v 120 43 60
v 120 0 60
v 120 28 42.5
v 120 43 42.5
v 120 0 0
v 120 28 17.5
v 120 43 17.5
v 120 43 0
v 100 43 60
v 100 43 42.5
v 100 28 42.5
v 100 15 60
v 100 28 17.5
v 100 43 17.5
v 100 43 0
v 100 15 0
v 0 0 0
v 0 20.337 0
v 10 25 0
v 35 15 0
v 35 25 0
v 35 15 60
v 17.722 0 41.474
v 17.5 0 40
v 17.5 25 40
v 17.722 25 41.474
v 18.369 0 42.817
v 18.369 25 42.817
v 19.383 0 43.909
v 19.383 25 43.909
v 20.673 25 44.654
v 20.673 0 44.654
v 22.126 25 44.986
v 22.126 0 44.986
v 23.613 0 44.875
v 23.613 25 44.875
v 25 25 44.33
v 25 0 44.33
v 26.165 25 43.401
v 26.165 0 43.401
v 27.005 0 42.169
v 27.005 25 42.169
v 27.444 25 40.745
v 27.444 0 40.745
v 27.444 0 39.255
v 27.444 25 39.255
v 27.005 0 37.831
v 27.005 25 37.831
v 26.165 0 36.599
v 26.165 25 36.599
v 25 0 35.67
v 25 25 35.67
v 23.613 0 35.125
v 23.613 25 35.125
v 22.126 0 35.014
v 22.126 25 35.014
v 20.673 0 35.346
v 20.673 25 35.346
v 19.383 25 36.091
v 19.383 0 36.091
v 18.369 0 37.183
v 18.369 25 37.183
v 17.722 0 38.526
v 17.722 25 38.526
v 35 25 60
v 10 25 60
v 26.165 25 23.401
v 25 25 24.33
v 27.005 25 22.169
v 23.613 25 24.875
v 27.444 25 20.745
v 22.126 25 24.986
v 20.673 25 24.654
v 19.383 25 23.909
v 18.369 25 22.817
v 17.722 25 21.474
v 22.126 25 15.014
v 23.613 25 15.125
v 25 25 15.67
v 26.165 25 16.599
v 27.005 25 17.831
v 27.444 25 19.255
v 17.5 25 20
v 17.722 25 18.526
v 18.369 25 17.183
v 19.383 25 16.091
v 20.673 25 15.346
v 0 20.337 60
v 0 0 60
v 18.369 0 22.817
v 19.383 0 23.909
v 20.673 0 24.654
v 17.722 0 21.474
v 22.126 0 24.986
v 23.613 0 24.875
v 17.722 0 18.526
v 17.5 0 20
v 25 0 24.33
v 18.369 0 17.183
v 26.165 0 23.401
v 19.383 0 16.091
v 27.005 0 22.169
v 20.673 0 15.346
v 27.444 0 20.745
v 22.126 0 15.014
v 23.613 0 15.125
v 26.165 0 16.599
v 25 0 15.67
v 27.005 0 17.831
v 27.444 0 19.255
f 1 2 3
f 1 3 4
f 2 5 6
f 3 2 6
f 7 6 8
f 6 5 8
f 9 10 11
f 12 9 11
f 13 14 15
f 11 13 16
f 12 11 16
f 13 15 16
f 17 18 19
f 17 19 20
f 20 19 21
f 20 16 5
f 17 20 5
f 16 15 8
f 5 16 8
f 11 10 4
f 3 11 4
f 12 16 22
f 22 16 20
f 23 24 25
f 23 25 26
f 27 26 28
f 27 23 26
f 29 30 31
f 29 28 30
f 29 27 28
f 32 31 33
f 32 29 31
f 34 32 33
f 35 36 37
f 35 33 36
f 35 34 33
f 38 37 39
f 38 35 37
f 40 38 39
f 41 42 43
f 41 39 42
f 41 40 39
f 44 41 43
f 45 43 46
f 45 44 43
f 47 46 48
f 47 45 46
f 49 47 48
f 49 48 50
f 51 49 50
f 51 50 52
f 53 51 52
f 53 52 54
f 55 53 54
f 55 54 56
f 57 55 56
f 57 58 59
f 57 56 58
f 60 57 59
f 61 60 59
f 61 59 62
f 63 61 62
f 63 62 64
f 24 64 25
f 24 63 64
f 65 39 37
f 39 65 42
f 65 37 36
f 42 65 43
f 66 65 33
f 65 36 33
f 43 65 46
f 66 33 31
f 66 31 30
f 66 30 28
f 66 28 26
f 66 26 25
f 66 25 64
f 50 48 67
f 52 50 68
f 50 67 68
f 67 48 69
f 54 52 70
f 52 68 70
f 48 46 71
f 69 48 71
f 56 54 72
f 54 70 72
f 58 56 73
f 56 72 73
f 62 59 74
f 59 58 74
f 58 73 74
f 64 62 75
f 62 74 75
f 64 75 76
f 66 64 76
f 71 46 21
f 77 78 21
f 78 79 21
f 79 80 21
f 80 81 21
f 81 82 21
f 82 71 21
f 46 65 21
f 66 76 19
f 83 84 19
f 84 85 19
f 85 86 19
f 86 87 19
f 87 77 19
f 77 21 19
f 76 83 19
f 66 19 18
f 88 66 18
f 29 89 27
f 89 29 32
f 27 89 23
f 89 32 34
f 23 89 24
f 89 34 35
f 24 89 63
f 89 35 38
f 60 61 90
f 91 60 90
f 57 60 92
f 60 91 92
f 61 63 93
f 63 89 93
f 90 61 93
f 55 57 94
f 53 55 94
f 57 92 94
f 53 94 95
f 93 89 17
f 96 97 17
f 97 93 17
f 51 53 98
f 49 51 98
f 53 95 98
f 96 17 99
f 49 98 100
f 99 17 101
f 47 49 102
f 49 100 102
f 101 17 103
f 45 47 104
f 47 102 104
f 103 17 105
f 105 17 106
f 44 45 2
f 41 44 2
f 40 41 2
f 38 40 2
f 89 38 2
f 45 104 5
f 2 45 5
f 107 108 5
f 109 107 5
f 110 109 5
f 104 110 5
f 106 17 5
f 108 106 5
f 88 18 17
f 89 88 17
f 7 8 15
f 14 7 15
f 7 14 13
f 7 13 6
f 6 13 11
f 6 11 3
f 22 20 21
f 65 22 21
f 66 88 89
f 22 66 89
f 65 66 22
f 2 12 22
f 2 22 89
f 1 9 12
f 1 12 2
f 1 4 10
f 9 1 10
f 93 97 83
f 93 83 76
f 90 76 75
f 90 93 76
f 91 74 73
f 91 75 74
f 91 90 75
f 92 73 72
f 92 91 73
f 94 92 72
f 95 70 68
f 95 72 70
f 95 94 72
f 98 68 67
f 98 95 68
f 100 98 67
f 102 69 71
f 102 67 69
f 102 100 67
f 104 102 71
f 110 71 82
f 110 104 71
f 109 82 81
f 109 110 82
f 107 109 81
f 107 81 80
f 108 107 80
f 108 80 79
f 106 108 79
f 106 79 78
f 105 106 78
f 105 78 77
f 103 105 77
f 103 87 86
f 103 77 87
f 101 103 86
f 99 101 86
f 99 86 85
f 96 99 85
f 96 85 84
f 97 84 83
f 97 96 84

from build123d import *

# Parameters (mm, degrees)
BOSS_EXTRUDE1_DEPTH     = 60
SKETCH2_W               = 20
SKETCH2_H               = 25
CUT_EXTRUDE1_DEPTH      = 15
CUT_EXTRUDE2_DEPTH      = 137.47344064
CUT_EXTRUDE2_DEPTH_BACK = 137.47344064
SKETCH3_R               = 5


with BuildPart() as part:
    # Sketch1 → Boss-Extrude1 (new body)
    with BuildSketch(Plane.XY):
        Polygon((0, 0), (120, 0), (120, 43), (100, 43), (100, 15), (35, 15), (35, 25), (10, 25), (0, 20.336923418), align=None)
    extrude(amount=BOSS_EXTRUDE1_DEPTH)

    # Sketch2 → Cut-Extrude1 (cut)
    with BuildSketch(Plane(origin=(0, 43, 0), x_dir=(1, 0, 0), z_dir=(0, 1, 0))):
        with Locations((110, -30)):
            Rectangle(SKETCH2_W, SKETCH2_H)
    extrude(amount=-CUT_EXTRUDE1_DEPTH, mode=Mode.SUBTRACT)

    # Sketch3 → Cut-Extrude2 (cut, two sides: drawn at the far end of the back side and taken through both)
    with BuildSketch(Plane(origin=(0, 25, 0), x_dir=(1, 0, 0), z_dir=(0, 1, 0)).offset(-CUT_EXTRUDE2_DEPTH_BACK)):
        with Locations(Location((22.5, -40, 0), (0, 0, 180))):
            Circle(SKETCH3_R)
        with Locations(Location((22.5, -20, 0), (0, 0, 180))):
            Circle(SKETCH3_R)
    extrude(amount=CUT_EXTRUDE2_DEPTH + CUT_EXTRUDE2_DEPTH_BACK, mode=Mode.SUBTRACT)


solid = part.part
